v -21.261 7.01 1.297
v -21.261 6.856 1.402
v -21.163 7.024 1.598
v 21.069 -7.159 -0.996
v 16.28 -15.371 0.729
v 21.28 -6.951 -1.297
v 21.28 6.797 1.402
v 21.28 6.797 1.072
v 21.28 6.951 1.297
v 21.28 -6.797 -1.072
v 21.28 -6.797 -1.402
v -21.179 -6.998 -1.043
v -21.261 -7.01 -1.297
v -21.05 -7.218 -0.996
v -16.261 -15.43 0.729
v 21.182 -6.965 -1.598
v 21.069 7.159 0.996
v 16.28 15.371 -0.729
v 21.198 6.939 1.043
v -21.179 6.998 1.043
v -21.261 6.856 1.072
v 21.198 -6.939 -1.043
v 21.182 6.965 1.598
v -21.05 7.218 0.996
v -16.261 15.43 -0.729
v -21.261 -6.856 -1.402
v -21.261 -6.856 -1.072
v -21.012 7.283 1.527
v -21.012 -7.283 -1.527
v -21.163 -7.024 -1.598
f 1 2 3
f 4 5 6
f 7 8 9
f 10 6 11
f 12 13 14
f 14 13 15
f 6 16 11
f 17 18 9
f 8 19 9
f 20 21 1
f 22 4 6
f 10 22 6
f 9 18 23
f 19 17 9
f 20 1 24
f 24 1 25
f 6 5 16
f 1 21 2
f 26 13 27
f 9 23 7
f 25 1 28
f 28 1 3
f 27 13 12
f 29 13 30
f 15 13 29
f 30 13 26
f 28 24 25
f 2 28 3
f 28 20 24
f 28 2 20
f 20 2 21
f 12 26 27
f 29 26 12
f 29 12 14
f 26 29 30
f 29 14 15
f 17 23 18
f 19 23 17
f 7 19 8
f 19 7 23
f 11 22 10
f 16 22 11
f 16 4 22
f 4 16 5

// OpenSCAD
// Auto-generated OpenSCAD file

    inner_points = 10*[[0.5000000000001233, 1.6099947582269307, -1.4642352461204697], [-1.6180339887500594, -0.7526043623065494, 1.3422446358941107], [0.8090169943752056, 0.7804419520270026, -1.929370322107236], [-1.3090169943749772, -1.5821571685064775, 0.8771095599073444], [1.3090169943749772, 1.5821571685064775, -0.8771095599073444], [-0.8090169943752056, -0.7804419520270026, 1.929370322107236], [1.6180339887500594, 0.7526043623065494, -1.3422446358941107], [-0.5000000000001233, -1.6099947582269307, 1.4642352461204697], [-1.6180339887497301, 0.752604362306319, -1.342244635894637], [-2.118033988749798, 0.1948703662791984, -0.6797246062536065], [-1.309016994374648, -0.07694844389360919, -1.8073797118814032], [-1.8090169943747159, -0.6346824399207297, -1.144859682240373], [1.8090169943747159, 0.6346824399207297, 1.144859682240373], [1.309016994374648, 0.07694844389360919, 1.8073797118814032], [2.118033988749798, -0.1948703662791984, 0.6797246062536065], [1.6180339887497301, -0.752604362306319, 1.342244635894637], [-2.7630675525358583e-14, 2.1025431187665826, -0.7519178221235898], [-1.30901699437522, 1.4920728358409685, 1.0228690720136886], [0.8618033988753376, -0.21095885990434457, -2.0491118170111076], [2.9809488211185453e-13, -2.021969242147636, -0.9474747285857835], [0.8090169943748263, 2.0747055290461294, -0.1647921359104645], [-0.500000000000366, 1.4642352461205153, 1.609994758226814], [1.6708203932501915, -0.2387964496247978, -1.4619861307979825], [0.8090169943751521, -2.0498068318680893, -0.3603490423726582], [-0.5000000000002721, 2.0296633627133747, 0.7851971800500518], [-1.309016994375247, 0.07694844389342262, 1.8073797118809776], [0.8618033988753109, -1.6260832518518904, -1.264601177143819], [-0.49999999999994665, -2.094848998200844, 0.5896402735878584], [-0.8090169943746892, 0.7804419520268874, -1.9293703221074994], [-2.118033988749815, -0.6797246062534129, -0.19487036627969367], [2.118033988749815, 0.6797246062534129, 0.19487036627969367], [0.8090169943746892, -0.7804419520268874, 1.9293703221074994], [-1.6180339887500161, 1.5371150021736077, 0.07287975605290908], [-0.49999999999963374, -1.4642352461205865, -1.6099947582269767], [0.49999999999963374, 1.4642352461205865, 1.6099947582269767], [1.6180339887500161, -1.5371150021736077, -0.07287975605290908], [-0.49999999999987643, 1.6099947582268597, -1.4642352461206323], [-2.1180339887499917, -0.19487036627950022, 0.6797246062529179], [3.4166940110491595e-13, 0.26775012233252143, -2.2168396084269855], [-1.6180339887497732, -1.5371150021738385, -0.07287975605343533], [1.6180339887497732, 1.5371150021738385, 0.07287975605343533], [-3.4166940110491595e-13, -0.26775012233252143, 2.2168396084269855], [2.1180339887499917, 0.19487036627950022, -0.6797246062529179], [0.49999999999987643, -1.6099947582268597, 1.4642352461206323], [-1.3090169943749175, 1.5821571685062912, -0.8771095599077703], [-2.118033988749975, 0.6797246062531112, 0.1948703662790049], [-0.4999999999996173, -0.5896402735879751, -2.0948489982008898], [-1.3090169943746748, -1.4920728358411552, -1.0228690720141145], [1.3090169943746748, 1.4920728358411552, 1.0228690720141145], [0.4999999999996173, 0.5896402735879751, 2.0948489982008898], [2.118033988749975, -0.6797246062531112, -0.1948703662790049], [1.3090169943749175, -1.5821571685062912, 0.8771095599077703], [-0.8090169943750684, 2.074705529046014, -0.1647921359107279], [-1.8090169943751788, 0.634682439920472, 1.1448596822397847], [0.36180339887537877, -1.068349255824841, -1.9271212067850119], [-0.8090169943747427, -2.0498068318682043, -0.3603490423729214], [0.4999999999997277, 2.029663362713446, 0.7851971800502144], [-0.5000000000003827, 0.5896402735879039, 2.0948489982007272], [1.6708203932501748, -1.1133914221574093, -0.9771318908240696], [0.5000000000000535, -2.0948489982007725, 0.589640273588021]];

    outer_points = 10*[[-0.5000000000005009, -0.7851971800501374, -2.0296633627132854], [-0.4999999999996386, 1.6099947582268983, 1.4642352461206711], [-0.5000000000003614, -1.6099947582268983, -1.4642352461204242], [-0.4999999999994991, 0.7851971800501374, 2.0296633627135323], [0.4999999999994991, -0.7851971800501374, -2.0296633627135323], [0.5000000000003614, 1.6099947582268983, 1.4642352461204242], [0.4999999999996386, -1.6099947582268983, -1.4642352461206711], [0.5000000000005009, 0.7851971800501374, 2.0296633627132854], [-2.1180339887500663, 0.12968473079194998, -0.6951128473842882], [-2.118033988749863, 0.6951128473848109, 0.1296847307924727], [-2.118033988749927, -0.6951128473848109, -0.12968473079142726], [-2.1180339887497235, -0.12968473079194998, 0.6951128473853336], [2.1180339887497235, 0.12968473079194998, -0.6951128473853336], [2.118033988749927, 0.6951128473848109, 0.12968473079142726], [2.118033988749863, -0.6951128473848109, -0.1296847307924727], [2.1180339887500663, -0.12968473079194998, 0.6951128473842882], [-0.5000000000005347, 0.2053913419602993, -2.166536954253724], [-0.5000000000001937, 2.029663362713409, -0.785197180050014], [-0.5000000000001456, -2.0948489982008094, -0.5896402735878118], [-0.49999999999960265, -1.4642352461205477, 1.6099947582270218], [0.4999999999994653, 0.2053913419602993, -2.1665369542539707], [0.4999999999998062, 2.029663362713409, -0.7851971800502607], [0.4999999999998545, -2.0948489982008094, -0.5896402735880585], [0.5000000000003973, -1.4642352461205477, 1.6099947582267748], [-3.811205046546957e-13, 1.612821613342072, -1.5443038629222117], [1.8556665349805936e-13, 2.102543118766584, 0.7519178221235856], [2.338283645958706e-13, -2.021969242147634, 0.9474747285857879], [5.50894046796066e-13, -0.05680497473877466, 2.2322278495585337], [-1.809016994375214, -0.7401550137174742, -1.0796740467522328], [-1.809016994374681, 0.7401550137174742, 1.0796740467531258], [1.809016994374681, -0.7401550137174742, -1.0796740467531258], [1.809016994375214, 0.7401550137174742, 1.0796740467522328], [-1.3090169943752, 1.4920728358410598, -1.0228690720135816], [-1.309016994374695, -1.4920728358410598, 1.0228690720142277], [1.309016994374695, 1.4920728358410598, -1.0228690720142277], [1.3090169943752, -1.4920728358410598, 1.0228690720135816], [-1.3090169943753898, -0.24760665317778863, -1.7919914707493183], [-1.309016994374731, 1.5821571685063862, 0.8771095599078771], [-1.309016994375164, -1.5821571685063862, -0.8771095599072309], [-1.3090169943745051, 0.24760665317778863, 1.7919914707499645], [1.3090169943745051, -0.24760665317778863, -1.7919914707499645], [1.309016994375164, 1.5821571685063862, 0.8771095599072309], [1.309016994374731, -1.5821571685063862, -0.8771095599078771], [1.3090169943753898, 0.24760665317778863, 1.7919914707493183], [-1.6180339887502422, 0.6222330913316356, -1.4074302713813738], [-1.6180339887499129, 1.537115002173723, -0.072879756052776], [-1.618033988749877, -1.537115002173723, 0.07287975605357463], [-1.6180339887495476, -0.6222330913316356, 1.4074302713821722], [1.6180339887495476, 0.6222330913316356, -1.4074302713821722], [1.618033988749877, 1.537115002173723, -0.07287975605357463], [1.6180339887499129, -1.537115002173723, 0.072879756052776], [1.6180339887502422, -0.6222330913316356, 1.4074302713813738], [-0.8090169943753872, 1.0752310864697234, -1.7819757548857793], [-0.8090169943749068, 2.0747055290460716, 0.16479213591079148], [-0.8090169943748585, -2.049806831868146, 0.36034904237299387], [-0.8090169943744552, -0.5943955016111235, 1.9945559575949663], [0.8090169943745077, 1.0752310864697234, -1.7819757548861785], [0.8090169943749881, 2.0747055290460716, 0.16479213591039218], [0.8090169943750364, -2.049806831868146, 0.3603490423725945], [0.8090169943754397, -0.5943955016111235, 1.994555957594567]];

    // Convex hull for inner set (I)
    module inner_hull() {
        hull() {
            for (p = inner_points) {
                translate(p) sphere(r=0.1);
            }
        }
    }

    // Convex hull for outer set (O) minus inner hull (O \ I)
    module outer_minus_inner() {
        difference() {
            hull() {
                for (p = outer_points) {
                    translate(p) sphere(r=0.1);
                }
            }
            inner_hull(); // Subtract inner hull
        }
    }

    // Convex hull for outer set (O) minus all translated inner hulls
    module outer_minus_AllTranslationInner() {
        difference() {
            hull() {
                for (p = outer_points) {
                    translate(p) sphere(r=0.1);
                }
            }
            hull() {
                translate([0,0,50]) inner_hull();
                translate([0,0,-50]) inner_hull();
            }; // Subtract translated inner hulls
        }
    }

    // Difference between outer_minus_inner and outer_minus_AllTranslationInner
    module outer_minus_inner_diff() {
        difference() {
            // Outer minus inner
            difference() {
                hull() {
                    for (p = outer_points) {
                        translate(p) sphere(r=0.1);
                    }
                }
                inner_hull();
            }

            // Subtract Outer minus AllTranslationInner
            difference() {
                hull() {
                    for (p = outer_points) {
                        translate(p) sphere(r=0.1);
                    }
                }
                hull() {
                    translate([0,0,50]) inner_hull();
                    translate([0,0,-50]) inner_hull();
                };
            }
        }
    }

    // Rendering all with colors applied
    color([0, 1, 0, 1]) outer_minus_AllTranslationInner(); // Opaque green
    
